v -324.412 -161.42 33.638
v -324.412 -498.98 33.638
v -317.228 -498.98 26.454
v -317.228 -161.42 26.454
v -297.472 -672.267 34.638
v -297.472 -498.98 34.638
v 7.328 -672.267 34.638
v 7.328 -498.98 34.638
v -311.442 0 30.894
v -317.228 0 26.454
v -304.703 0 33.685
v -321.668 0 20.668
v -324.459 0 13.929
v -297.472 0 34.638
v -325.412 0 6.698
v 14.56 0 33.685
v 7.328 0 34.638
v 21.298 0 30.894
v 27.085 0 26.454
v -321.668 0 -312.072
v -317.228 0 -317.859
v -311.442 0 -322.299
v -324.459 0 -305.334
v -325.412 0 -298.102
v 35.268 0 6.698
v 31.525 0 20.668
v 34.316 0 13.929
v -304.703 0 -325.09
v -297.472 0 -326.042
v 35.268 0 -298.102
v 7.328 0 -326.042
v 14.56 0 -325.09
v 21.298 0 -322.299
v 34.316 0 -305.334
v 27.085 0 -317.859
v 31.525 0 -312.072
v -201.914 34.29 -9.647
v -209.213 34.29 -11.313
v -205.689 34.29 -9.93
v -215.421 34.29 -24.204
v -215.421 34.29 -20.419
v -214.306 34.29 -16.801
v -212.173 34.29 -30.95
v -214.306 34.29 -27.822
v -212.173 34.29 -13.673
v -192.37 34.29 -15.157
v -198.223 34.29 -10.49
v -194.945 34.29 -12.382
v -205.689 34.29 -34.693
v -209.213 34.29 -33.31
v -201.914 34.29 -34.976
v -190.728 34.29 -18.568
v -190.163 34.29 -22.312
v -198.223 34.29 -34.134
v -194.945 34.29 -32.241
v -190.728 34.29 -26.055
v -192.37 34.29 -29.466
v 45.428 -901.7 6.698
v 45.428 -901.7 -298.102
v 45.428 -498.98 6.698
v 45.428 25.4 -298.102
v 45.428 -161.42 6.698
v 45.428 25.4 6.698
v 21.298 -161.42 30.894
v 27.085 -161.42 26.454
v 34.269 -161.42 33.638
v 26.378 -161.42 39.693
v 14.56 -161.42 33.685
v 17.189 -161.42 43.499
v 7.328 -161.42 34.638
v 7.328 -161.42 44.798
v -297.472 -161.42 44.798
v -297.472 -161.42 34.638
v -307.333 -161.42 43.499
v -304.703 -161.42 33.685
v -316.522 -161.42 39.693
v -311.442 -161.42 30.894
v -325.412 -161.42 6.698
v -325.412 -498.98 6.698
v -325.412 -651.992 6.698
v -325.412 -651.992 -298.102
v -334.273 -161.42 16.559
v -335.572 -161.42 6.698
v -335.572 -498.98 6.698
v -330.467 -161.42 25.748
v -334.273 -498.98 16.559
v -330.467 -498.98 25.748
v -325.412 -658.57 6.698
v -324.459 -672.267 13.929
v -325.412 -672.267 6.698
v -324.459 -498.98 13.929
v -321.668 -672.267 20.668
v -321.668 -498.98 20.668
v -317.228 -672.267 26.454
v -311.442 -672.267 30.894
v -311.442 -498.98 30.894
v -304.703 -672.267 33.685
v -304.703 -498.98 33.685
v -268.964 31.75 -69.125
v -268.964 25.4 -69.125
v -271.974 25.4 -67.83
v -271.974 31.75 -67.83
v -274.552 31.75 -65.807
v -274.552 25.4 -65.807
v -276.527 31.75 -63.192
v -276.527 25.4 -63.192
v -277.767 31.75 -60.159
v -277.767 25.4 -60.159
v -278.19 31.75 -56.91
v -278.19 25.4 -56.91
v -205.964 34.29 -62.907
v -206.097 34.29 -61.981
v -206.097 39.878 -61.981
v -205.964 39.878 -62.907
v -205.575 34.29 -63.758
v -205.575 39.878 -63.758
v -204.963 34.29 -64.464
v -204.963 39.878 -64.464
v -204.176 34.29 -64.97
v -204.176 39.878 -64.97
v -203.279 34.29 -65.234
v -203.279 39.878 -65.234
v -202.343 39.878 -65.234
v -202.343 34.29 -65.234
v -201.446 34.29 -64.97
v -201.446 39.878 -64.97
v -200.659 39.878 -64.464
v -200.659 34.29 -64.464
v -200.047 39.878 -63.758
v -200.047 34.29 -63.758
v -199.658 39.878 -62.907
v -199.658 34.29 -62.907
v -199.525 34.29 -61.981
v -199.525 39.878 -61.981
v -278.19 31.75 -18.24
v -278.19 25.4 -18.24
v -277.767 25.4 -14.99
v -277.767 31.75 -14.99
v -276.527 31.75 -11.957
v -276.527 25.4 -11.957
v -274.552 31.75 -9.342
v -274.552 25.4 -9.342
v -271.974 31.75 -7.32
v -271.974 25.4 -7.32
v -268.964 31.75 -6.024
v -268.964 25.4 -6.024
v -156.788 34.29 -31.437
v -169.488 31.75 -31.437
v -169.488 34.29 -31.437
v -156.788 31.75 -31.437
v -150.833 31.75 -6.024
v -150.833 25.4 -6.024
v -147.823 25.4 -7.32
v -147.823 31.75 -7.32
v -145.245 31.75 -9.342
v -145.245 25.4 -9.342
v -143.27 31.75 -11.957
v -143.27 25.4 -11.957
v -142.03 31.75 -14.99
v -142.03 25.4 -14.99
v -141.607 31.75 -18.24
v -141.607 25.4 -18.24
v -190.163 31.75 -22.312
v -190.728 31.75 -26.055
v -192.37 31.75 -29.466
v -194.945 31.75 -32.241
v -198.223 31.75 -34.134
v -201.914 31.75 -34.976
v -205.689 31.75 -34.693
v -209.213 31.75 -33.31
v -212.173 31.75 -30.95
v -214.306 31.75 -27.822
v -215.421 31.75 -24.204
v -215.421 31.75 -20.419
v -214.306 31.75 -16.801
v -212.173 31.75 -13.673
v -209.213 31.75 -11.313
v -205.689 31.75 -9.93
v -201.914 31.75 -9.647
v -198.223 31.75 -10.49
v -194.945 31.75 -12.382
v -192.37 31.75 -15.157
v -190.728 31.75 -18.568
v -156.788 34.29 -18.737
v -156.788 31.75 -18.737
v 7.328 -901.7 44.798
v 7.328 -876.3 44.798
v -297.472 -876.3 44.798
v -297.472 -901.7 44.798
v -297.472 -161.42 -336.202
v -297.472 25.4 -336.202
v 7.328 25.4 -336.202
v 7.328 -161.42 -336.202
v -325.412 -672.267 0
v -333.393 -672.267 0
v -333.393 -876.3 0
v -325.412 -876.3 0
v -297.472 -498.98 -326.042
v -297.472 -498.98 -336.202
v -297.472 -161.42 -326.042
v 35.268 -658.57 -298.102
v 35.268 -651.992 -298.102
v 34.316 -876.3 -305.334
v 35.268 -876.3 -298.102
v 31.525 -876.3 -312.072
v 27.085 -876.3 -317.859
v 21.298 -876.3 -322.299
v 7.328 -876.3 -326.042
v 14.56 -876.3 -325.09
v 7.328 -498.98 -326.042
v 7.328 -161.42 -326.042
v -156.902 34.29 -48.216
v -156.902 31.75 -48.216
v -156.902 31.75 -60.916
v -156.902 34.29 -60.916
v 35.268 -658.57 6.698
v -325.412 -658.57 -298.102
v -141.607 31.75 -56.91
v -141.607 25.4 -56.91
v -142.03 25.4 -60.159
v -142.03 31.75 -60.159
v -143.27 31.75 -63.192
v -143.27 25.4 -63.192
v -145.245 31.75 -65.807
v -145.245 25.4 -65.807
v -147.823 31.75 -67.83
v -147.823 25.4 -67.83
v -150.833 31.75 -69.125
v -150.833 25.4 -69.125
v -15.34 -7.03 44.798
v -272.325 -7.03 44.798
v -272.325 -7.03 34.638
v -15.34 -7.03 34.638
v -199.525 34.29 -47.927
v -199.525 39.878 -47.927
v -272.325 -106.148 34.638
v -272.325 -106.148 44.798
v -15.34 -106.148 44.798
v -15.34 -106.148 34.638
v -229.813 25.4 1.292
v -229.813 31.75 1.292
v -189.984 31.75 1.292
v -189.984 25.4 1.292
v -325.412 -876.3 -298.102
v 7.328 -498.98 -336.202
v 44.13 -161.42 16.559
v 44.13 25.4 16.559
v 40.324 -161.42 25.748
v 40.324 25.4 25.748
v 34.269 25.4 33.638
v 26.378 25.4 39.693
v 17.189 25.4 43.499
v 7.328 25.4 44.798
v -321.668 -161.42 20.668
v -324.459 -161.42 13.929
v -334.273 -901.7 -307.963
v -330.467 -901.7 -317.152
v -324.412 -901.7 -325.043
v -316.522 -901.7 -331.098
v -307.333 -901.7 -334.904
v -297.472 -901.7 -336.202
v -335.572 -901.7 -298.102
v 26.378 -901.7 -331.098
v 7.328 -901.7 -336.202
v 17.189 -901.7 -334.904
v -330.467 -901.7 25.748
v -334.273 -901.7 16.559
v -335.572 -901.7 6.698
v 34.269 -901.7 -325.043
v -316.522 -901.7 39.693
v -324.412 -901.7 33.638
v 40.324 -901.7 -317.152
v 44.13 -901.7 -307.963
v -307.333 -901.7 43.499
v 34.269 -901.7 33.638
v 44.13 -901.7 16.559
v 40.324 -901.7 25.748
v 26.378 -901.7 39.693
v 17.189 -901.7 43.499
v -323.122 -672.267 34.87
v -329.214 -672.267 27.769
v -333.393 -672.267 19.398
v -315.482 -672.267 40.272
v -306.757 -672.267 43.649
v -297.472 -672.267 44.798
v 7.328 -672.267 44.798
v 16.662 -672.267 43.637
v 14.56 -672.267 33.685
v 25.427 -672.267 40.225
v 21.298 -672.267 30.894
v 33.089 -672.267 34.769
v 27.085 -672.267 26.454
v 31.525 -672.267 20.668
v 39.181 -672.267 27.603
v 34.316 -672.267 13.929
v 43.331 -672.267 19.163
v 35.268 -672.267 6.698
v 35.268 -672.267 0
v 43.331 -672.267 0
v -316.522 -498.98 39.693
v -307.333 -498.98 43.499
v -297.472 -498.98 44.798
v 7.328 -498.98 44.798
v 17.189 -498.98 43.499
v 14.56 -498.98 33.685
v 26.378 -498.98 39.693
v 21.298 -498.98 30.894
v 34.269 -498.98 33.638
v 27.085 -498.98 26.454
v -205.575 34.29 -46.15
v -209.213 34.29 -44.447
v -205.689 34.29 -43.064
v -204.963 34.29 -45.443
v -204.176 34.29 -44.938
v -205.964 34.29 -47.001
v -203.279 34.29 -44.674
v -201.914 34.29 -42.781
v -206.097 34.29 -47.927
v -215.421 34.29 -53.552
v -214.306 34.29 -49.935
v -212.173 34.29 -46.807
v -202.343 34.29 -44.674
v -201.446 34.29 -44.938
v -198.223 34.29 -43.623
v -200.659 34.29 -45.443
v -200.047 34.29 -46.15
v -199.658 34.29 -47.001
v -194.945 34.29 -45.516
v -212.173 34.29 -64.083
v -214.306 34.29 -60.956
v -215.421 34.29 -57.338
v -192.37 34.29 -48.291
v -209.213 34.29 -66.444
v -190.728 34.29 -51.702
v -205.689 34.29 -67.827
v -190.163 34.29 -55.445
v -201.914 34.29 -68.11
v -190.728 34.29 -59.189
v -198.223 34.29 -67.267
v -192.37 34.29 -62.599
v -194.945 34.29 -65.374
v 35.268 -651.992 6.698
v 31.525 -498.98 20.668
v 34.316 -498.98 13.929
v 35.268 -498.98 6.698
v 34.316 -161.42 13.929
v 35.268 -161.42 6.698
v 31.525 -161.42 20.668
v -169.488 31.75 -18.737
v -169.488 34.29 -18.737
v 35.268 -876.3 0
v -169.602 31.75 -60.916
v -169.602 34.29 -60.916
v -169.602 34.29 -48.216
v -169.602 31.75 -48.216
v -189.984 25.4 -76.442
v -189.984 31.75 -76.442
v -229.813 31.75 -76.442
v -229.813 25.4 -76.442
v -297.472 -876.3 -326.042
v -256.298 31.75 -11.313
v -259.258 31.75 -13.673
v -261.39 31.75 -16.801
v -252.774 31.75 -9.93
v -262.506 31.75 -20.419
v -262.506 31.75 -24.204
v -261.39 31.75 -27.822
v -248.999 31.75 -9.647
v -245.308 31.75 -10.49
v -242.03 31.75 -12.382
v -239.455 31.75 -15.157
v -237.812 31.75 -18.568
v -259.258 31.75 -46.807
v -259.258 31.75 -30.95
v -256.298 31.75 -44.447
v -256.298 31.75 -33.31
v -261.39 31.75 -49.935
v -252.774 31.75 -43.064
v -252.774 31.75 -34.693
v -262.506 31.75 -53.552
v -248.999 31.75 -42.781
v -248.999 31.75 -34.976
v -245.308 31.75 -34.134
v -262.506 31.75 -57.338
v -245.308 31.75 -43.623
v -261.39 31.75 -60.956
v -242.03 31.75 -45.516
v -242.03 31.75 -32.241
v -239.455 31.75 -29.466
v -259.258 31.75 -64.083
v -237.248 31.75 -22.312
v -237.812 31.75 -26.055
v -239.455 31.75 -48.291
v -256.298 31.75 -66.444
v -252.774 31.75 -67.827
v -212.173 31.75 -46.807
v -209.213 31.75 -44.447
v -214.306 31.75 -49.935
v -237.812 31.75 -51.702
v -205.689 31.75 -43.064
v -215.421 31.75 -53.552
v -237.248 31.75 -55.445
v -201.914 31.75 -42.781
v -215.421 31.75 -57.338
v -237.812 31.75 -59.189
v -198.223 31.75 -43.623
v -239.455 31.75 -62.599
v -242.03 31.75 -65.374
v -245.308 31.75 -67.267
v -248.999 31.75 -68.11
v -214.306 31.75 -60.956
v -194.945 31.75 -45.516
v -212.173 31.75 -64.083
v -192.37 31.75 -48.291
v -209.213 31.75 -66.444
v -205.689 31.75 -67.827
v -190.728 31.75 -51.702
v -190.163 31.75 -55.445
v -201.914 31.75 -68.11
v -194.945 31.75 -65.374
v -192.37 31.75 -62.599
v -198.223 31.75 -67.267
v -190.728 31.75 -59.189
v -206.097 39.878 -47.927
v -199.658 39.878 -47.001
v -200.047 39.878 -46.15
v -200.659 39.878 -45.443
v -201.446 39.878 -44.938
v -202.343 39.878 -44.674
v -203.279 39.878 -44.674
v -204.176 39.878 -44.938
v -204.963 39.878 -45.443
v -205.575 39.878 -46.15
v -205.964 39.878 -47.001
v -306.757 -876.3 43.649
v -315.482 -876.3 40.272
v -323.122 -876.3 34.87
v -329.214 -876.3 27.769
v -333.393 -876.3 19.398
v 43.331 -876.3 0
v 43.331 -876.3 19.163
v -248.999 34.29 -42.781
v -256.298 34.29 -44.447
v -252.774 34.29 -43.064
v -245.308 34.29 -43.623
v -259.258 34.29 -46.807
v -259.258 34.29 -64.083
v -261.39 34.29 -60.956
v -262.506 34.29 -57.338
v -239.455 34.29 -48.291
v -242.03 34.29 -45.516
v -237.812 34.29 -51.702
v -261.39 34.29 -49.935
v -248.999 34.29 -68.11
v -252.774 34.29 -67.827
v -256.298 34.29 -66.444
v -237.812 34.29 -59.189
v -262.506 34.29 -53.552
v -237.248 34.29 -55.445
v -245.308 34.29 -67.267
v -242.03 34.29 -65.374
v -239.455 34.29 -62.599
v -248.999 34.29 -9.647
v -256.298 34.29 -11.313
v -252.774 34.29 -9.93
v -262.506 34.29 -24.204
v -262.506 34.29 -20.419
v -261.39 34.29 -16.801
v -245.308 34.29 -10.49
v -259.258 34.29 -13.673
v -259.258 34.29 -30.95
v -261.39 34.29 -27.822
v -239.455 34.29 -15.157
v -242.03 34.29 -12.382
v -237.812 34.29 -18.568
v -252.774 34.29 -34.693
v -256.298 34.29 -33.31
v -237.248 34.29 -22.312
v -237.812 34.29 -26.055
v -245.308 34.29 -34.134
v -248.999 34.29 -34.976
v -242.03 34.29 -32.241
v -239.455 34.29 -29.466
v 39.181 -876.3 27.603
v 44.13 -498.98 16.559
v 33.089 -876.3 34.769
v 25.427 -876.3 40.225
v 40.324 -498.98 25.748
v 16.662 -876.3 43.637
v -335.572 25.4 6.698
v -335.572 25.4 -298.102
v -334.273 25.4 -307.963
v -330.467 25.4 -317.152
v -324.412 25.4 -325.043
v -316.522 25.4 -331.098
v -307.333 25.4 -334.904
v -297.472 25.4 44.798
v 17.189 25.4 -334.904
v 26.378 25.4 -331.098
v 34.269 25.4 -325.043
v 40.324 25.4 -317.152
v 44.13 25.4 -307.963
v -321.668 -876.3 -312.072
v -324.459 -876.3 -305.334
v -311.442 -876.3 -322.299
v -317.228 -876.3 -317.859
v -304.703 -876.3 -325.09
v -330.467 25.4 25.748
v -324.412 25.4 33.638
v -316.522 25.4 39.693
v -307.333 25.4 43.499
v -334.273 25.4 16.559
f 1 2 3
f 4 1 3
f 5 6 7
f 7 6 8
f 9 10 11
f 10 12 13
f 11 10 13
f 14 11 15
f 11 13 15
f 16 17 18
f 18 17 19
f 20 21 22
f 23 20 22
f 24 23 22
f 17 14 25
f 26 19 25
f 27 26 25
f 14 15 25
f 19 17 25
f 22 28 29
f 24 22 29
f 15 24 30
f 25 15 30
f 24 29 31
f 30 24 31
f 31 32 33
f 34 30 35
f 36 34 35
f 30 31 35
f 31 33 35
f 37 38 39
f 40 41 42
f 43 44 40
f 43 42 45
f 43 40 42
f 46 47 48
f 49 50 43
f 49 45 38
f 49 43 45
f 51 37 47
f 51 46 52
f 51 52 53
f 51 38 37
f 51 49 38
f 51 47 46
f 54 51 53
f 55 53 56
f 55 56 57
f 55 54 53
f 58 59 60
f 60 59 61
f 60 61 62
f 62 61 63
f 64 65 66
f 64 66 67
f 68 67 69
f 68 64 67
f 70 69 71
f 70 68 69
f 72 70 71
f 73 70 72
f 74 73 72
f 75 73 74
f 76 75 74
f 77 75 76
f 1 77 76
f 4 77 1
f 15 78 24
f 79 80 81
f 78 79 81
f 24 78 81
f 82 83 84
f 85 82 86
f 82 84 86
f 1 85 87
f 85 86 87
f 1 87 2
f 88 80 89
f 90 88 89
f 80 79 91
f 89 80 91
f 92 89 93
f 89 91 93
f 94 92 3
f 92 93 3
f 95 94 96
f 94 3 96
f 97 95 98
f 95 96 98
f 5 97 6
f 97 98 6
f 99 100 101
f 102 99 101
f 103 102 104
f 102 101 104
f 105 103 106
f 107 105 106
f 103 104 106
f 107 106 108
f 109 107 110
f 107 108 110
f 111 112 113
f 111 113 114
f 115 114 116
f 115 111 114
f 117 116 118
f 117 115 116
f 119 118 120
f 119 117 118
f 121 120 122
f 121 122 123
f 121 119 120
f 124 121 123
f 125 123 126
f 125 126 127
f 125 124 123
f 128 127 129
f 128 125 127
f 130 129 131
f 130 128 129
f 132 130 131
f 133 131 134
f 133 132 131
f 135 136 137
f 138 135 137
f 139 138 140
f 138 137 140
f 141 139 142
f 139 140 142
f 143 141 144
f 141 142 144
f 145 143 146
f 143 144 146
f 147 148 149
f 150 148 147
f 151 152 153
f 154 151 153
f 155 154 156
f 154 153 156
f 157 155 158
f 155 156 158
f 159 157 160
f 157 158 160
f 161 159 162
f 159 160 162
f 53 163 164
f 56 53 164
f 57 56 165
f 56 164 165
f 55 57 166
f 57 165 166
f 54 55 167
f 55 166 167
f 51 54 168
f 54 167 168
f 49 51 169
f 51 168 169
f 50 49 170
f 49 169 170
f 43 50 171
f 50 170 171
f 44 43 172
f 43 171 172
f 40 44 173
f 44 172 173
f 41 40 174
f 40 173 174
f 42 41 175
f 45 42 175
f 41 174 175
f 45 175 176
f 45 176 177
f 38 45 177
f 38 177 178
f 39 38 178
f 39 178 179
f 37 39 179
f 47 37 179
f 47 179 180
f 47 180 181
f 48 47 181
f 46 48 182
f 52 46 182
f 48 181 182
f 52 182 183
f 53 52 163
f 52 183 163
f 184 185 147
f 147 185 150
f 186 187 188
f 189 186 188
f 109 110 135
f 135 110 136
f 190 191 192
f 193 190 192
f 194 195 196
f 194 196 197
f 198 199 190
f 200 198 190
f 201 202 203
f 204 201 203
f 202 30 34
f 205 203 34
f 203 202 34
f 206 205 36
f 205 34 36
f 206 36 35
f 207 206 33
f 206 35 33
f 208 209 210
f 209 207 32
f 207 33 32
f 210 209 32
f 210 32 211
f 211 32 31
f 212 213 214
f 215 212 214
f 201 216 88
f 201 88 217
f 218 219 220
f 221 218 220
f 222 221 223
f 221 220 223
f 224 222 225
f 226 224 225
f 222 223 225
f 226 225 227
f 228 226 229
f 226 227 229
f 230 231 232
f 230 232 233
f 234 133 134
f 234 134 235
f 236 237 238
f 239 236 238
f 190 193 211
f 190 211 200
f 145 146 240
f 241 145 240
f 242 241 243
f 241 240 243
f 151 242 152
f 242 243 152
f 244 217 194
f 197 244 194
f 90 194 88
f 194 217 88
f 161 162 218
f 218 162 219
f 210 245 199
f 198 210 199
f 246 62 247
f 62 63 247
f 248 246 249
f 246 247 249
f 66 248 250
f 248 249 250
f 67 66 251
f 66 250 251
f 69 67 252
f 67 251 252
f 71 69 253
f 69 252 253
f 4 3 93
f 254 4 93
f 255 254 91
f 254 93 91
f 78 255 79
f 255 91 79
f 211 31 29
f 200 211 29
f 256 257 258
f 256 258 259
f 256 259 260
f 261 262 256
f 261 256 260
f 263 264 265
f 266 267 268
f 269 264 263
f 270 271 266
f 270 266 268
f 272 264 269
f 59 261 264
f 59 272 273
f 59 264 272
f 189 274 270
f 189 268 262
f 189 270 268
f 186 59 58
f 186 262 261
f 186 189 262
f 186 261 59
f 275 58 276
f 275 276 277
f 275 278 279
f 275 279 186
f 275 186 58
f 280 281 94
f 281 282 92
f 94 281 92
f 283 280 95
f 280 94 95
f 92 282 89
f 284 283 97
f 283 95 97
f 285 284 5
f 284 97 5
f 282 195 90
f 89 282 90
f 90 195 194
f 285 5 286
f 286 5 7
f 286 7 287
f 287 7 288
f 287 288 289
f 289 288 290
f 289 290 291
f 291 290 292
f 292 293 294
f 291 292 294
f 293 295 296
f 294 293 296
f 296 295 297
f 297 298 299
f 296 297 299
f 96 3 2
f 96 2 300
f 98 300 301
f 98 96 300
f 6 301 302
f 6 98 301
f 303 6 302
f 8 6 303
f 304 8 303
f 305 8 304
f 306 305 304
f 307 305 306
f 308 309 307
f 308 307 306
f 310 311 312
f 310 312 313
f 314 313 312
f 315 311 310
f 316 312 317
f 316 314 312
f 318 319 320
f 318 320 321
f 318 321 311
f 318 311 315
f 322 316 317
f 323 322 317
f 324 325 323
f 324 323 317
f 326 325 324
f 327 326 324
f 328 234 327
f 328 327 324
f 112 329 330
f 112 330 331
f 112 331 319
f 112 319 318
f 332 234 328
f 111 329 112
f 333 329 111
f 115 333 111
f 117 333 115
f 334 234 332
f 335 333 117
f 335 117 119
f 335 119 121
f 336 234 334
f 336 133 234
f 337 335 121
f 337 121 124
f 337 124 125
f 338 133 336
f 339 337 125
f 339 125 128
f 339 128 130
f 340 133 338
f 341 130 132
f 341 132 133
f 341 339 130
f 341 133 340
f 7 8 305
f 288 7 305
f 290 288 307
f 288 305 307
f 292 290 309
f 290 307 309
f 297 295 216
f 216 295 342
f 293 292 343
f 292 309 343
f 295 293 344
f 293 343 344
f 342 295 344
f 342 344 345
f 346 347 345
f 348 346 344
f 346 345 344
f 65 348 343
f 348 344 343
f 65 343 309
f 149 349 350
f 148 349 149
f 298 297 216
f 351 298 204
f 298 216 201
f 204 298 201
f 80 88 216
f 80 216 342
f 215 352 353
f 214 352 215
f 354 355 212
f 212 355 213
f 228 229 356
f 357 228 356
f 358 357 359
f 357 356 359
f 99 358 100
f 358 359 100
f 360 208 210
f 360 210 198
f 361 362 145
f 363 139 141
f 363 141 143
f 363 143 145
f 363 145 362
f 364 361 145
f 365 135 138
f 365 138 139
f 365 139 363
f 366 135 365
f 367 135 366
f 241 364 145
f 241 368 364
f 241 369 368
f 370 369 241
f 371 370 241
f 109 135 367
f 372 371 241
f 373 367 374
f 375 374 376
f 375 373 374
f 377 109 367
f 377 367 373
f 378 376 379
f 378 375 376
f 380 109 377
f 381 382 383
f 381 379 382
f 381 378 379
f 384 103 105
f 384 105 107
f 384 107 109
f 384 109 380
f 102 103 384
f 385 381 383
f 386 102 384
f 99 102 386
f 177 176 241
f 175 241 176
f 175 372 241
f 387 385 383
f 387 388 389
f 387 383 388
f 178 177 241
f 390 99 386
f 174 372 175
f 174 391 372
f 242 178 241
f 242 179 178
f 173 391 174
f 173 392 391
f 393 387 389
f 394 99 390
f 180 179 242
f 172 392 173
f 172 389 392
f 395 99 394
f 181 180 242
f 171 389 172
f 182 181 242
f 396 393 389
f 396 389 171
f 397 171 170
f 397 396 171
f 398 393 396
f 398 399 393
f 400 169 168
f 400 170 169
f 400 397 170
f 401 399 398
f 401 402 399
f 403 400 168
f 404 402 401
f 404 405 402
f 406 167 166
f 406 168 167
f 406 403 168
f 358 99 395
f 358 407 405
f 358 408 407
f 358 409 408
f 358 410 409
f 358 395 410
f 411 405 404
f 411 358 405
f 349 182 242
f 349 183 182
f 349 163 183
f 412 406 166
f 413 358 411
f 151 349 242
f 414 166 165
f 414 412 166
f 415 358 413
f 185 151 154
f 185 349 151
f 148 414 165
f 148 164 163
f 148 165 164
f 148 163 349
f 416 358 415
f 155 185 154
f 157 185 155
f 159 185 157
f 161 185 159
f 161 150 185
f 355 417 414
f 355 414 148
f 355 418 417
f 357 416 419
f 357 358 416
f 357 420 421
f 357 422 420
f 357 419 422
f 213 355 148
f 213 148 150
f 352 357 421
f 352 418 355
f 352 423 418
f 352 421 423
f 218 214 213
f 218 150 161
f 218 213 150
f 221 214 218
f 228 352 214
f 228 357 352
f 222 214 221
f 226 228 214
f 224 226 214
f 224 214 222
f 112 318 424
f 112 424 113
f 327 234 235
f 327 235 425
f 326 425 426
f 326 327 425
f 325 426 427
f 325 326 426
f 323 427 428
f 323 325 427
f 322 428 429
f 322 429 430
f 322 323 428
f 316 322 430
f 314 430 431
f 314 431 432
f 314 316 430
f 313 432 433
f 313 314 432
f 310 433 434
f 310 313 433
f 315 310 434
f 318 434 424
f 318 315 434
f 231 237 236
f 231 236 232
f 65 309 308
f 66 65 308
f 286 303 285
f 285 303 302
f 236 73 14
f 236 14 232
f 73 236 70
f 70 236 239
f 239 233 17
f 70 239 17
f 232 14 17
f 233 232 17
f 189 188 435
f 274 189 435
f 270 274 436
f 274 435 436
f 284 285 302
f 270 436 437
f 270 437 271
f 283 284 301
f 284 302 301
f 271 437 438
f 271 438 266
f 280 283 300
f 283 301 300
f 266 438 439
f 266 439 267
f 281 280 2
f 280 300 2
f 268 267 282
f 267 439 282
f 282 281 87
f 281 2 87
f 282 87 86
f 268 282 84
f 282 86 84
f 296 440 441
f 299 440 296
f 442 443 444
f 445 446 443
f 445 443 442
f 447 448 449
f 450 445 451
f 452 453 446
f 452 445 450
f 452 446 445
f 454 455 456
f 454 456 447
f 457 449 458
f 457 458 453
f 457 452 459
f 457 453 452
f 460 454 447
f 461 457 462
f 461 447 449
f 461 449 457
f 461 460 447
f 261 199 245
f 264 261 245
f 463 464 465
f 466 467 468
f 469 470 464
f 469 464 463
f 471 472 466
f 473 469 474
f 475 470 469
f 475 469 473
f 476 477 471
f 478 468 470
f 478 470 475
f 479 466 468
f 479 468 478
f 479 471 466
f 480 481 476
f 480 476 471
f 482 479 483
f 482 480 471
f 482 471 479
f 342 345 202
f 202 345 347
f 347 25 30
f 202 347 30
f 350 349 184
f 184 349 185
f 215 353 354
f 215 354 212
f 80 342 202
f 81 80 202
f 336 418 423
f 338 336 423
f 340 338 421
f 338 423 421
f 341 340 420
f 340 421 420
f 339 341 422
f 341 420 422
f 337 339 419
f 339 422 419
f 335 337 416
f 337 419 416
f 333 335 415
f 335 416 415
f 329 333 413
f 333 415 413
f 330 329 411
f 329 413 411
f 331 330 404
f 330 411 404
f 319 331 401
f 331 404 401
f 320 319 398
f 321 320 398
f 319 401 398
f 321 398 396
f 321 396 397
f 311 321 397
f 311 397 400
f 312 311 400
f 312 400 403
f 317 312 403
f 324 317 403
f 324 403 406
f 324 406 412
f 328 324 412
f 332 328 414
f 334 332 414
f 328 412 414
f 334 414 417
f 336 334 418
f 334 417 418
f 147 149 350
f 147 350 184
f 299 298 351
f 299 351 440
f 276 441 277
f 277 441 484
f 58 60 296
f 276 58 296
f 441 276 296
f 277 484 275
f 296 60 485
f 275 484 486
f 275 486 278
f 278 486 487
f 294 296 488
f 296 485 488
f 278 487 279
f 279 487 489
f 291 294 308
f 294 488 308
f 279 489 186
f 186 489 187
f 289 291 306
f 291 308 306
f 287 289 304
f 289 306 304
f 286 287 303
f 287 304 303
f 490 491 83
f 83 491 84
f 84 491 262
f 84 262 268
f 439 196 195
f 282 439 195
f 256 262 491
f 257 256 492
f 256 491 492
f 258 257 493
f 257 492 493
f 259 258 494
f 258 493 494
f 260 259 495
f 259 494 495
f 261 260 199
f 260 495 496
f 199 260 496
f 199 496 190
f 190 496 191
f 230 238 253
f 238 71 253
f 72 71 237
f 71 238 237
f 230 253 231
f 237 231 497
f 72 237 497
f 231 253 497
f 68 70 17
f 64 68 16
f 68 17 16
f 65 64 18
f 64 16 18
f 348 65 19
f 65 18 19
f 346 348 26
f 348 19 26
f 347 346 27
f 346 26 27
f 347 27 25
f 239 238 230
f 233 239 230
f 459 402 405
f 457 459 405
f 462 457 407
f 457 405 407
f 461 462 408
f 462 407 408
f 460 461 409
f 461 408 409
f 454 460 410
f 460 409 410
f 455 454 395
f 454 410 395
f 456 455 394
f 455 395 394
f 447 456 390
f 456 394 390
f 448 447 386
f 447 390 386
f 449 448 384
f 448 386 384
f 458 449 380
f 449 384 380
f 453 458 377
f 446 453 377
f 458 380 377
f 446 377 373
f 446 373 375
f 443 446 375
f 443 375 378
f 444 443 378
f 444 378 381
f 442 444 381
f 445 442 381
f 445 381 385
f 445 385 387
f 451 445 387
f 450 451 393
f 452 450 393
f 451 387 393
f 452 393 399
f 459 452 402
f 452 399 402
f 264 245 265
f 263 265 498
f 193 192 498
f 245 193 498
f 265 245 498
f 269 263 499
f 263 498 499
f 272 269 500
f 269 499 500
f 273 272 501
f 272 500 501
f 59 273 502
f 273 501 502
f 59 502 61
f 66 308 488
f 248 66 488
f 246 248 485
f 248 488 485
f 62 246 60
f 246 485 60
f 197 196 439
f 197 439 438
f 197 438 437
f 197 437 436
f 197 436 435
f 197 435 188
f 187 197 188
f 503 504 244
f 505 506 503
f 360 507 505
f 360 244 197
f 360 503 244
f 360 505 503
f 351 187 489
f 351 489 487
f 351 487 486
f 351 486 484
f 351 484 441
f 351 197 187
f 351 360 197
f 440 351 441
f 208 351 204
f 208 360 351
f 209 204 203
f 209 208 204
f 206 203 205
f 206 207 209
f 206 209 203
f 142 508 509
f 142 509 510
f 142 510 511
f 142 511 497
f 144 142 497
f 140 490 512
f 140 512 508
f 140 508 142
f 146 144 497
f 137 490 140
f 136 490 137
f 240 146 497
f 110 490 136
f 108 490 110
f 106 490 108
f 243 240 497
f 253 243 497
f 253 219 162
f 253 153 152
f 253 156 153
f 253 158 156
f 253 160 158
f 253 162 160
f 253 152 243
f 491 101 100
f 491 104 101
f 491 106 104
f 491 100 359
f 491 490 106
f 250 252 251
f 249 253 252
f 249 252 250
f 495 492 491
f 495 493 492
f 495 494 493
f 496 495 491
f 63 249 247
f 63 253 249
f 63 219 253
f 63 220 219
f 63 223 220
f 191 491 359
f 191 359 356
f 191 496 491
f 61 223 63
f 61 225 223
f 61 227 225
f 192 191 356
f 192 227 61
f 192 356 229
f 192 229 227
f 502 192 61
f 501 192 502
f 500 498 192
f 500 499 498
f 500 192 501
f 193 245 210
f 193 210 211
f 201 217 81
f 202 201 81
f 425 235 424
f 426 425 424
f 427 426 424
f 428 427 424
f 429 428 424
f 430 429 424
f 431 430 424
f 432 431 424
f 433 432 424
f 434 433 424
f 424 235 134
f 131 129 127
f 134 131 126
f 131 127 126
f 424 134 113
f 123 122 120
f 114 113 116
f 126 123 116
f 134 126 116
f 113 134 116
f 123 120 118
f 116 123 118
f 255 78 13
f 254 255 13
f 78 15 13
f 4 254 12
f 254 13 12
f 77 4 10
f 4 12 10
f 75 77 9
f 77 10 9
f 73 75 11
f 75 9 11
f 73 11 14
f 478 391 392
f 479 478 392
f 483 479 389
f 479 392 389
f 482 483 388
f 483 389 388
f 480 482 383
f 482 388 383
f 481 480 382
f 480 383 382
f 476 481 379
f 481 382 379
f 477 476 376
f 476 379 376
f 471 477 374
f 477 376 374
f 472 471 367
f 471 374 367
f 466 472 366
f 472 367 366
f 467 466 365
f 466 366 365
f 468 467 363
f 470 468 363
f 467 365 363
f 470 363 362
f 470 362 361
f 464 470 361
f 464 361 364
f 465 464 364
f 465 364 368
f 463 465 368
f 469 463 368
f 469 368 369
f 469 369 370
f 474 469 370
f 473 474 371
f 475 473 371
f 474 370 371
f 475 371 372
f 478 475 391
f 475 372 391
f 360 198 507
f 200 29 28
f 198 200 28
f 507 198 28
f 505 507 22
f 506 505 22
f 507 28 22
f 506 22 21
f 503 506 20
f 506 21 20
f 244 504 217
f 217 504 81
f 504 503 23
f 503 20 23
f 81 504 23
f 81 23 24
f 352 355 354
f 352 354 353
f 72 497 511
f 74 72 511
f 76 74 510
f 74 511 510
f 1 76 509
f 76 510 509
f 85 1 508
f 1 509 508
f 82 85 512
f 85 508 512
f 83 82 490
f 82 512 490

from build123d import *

# Parameters (mm, degrees)
SKETCH1_W            = 381
SKETCH1_H            = 381
BOSS_EXTRUDE1_DEPTH  = 25.4
BOSS_EXTRUDE2_DEPTH  = 6.35
SKETCH3_R            = 12.7
SKETCH3_W            = 12.7
SKETCH3_H            = 12.7
BOSS_EXTRUDE3_DEPTH  = 2.54
FILLET1_R            = 38.1
BOSS_EXTRUDE4_DEPTH  = 914.4
BOSS_EXTRUDE5_DEPTH  = 12.7
CUT_EXTRUDE2_DEPTH   = 167.894
SKETCH11_W           = 304.8
SKETCH11_H           = 337.560693512
CUT_EXTRUDE7_DEPTH   = 110.998
SKETCH14_W           = 376.723987394
SKETCH14_H           = 204.033096405
CUT_EXTRUDE9_DEPTH   = 672.066
BOSS_EXTRUDE7_DEPTH  = 12.7
BOSS_EXTRUDE8_REACH  = 372.84
SKETCH16_W           = 304.8
SKETCH16_H           = 6.578487437
SKETCH17_W           = 256.984779842
SKETCH17_H           = 99.117758391
CUT_EXTRUDE10_DEPTH  = 65.532
BOSS_EXTRUDE9_DEPTH  = 337.560694
BOSS_EXTRUDE10_DEPTH = 5.588


with BuildPart() as part:
    # Sketch1 → Boss-Extrude1 (new body)
    with BuildSketch(Plane(origin=(0, 0, 0), x_dir=(1, 0, 0), z_dir=(0, 1, 0))):
        with Locations((-145.071527203, 145.702478214)):
            Rectangle(SKETCH1_W, SKETCH1_H)
    extrude(amount=BOSS_EXTRUDE1_DEPTH)

    # Sketch2 → Boss-Extrude2 (add)
    with BuildSketch(Plane(origin=(0, 25.4, 0), x_dir=(1, 0, 0), z_dir=(0, 1, 0))):
        with BuildLine():
            Line((-278.18981895, 56.909871518), (-278.18981895, 18.239718765))
            ThreePointArc((-278.18981895, 18.239718765), (-275.624301912, 10.585814199), (-268.964266966, 6.024228149))
            ThreePointArc((-268.964266966, 6.024228149), (-209.898650693, -2.212431383), (-150.833034421, 6.024228149))
            ThreePointArc((-150.833034421, 6.024228149), (-144.172999475, 10.585814199), (-141.607482437, 18.239718765))
            Line((-141.607482437, 18.239718765), (-141.607482437, 56.909871518))
            ThreePointArc((-141.607482437, 56.909871518), (-144.172999475, 64.563776083), (-150.833034421, 69.125362134))
            ThreePointArc((-150.833034421, 69.125362134), (-209.898650693, 77.362021666), (-268.964266966, 69.125362134))
            ThreePointArc((-268.964266966, 69.125362134), (-275.624301912, 64.563776083), (-278.18981895, 56.909871518))
        make_face()
    extrude(amount=BOSS_EXTRUDE2_DEPTH)

    # Sketch3 → Boss-Extrude3 (add)
    with BuildSketch(Plane(origin=(0, 31.75, 0), x_dir=(1, 0, 0), z_dir=(0, 1, 0))):
        with Locations((-249.948168026, 55.44519483)):
            Circle(SKETCH3_R)
        with Locations((-249.948168026, 22.311626762)):
            Circle(SKETCH3_R)
        with Locations((-202.863297366, 55.44519483)):
            Circle(SKETCH3_R)
        with Locations((-202.863297366, 22.311626762)):
            Circle(SKETCH3_R)
        with Locations((-163.252071019, 54.565913405)):
            Rectangle(SKETCH3_W, SKETCH3_H)
        with Locations((-163.138085387, 25.086983412)):
            Rectangle(SKETCH3_W, SKETCH3_H)
    extrude(amount=BOSS_EXTRUDE3_DEPTH)

    # Fillet1
    fillet1_edges = [part.edges().sort_by_distance(p)[0] for p in [
        (-335.571527203, 12.7, -336.202478214),
        (45.428472797, 12.7, -336.202478214),
        (45.428472797, 12.7, 44.797521786),
        (-335.571527203, 12.7, 44.797521786),
    ]]
    fillet(fillet1_edges, radius=FILLET1_R)

    # Sketch6 → Boss-Extrude4 (add)
    with BuildSketch(Plane(origin=(0, 25.4, 0), x_dir=(1, 0, 0), z_dir=(0, 1, 0))):
        with BuildLine():
            Line((-335.571527203, 298.102478214), (-335.571527203, -6.697521786))
            ThreePointArc((-335.571527203, -6.697521786), (-324.412295566, -33.638290149), (-297.471527203, -44.797521786))
            Line((-297.471527203, -44.797521786), (7.328472797, -44.797521786))
            ThreePointArc((7.328472797, -44.797521786), (34.26924116, -33.638290149), (45.428472797, -6.697521786))
            Line((45.428472797, -6.697521786), (45.428472797, 298.102478214))
            ThreePointArc((45.428472797, 298.102478214), (34.26924116, 325.043246577), (7.328472797, 336.202478214))
            Line((7.328472797, 336.202478214), (-297.471527203, 336.202478214))
            ThreePointArc((-297.471527203, 336.202478214), (-324.412295566, 325.043246577), (-335.571527203, 298.102478214))
        make_face()
        with BuildLine():
            Line((7.328472797, 326.042478214), (-297.471527203, 326.042478214))
            ThreePointArc((-297.471527203, 326.042478214), (-317.22809067, 317.859041681), (-325.411527203, 298.102478214))
            Line((-325.411527203, 298.102478214), (-325.411527203, -6.697521786))
            ThreePointArc((-325.411527203, -6.697521786), (-317.22809067, -26.454085252), (-297.471527203, -34.637521786))
            Line((-297.471527203, -34.637521786), (7.328472797, -34.637521786))
            ThreePointArc((7.328472797, -34.637521786), (27.085036263, -26.454085252), (35.268472797, -6.697521786))
            Line((35.268472797, -6.697521786), (35.268472797, 298.102478214))
            ThreePointArc((35.268472797, 298.102478214), (27.085036263, 317.859041681), (7.328472797, 326.042478214))
        make_face(mode=Mode.SUBTRACT)
    extrude(amount=-BOSS_EXTRUDE4_DEPTH)

    # Sketch7 → Boss-Extrude5 (add)
    with BuildSketch(Plane.XZ.offset(889)):
        with BuildLine():
            Line((-297.471527203, -336.202478214), (7.328472797, -336.202478214))
            ThreePointArc((7.328472797, -336.202478214), (34.26924116, -325.043246577), (45.428472797, -298.102478214))
            Line((45.428472797, -298.102478214), (45.428472797, 6.697521786))
            ThreePointArc((45.428472797, 6.697521786), (34.26924116, 33.638290149), (7.328472797, 44.797521786))
            Line((7.328472797, 44.797521786), (-297.471527203, 44.797521786))
            ThreePointArc((-297.471527203, 44.797521786), (-324.412295566, 33.638290149), (-335.571527203, 6.697521786))
            Line((-335.571527203, 6.697521786), (-335.571527203, -298.102478214))
            ThreePointArc((-335.571527203, -298.102478214), (-324.412295566, -325.043246577), (-297.471527203, -336.202478214))
        make_face()
    extrude(amount=BOSS_EXTRUDE5_DEPTH)

    # Sketch9 → Cut-Extrude2 (cut)
    with BuildSketch(Plane.XY):
        with BuildLine():
            Line((45.428472797, -161.419653244), (-335.571527203, -161.419653244))
            Line((-335.571527203, -161.419653244), (-259.140976729, -229.136056455))
            ThreePointArc((-259.140976729, -229.136056455), (-145.071527203, -177.8), (-31.002077677, -229.136056455))
            Line((-31.002077677, -229.136056455), (45.428472797, -161.419653244))
        make_face()
        with BuildLine():
            Line((-335.571527203, -161.419653244), (-335.571527203, -498.980346756))
            Line((-335.571527203, -498.980346756), (-259.140976729, -431.263943545))
            ThreePointArc((-259.140976729, -431.263943545), (-297.471527203, -330.2), (-259.140976729, -229.136056455))
            Line((-259.140976729, -229.136056455), (-335.571527203, -161.419653244))
        make_face()
        with BuildLine():
            Line((-31.002077677, -431.263943545), (45.428472797, -498.980346756))
            Line((45.428472797, -498.980346756), (45.428472797, -161.419653244))
            Line((45.428472797, -161.419653244), (-31.002077677, -229.136056455))
            ThreePointArc((-31.002077677, -229.136056455), (-2.576011295, -276.155685349), (7.328472797, -330.2))
            ThreePointArc((7.328472797, -330.2), (-2.576011295, -384.244314651), (-31.002077677, -431.263943545))
        make_face()
        with BuildLine():
            Line((-259.140976729, -431.263943545), (-335.571527203, -498.980346756))
            Line((-335.571527203, -498.980346756), (45.428472797, -498.980346756))
            Line((45.428472797, -498.980346756), (-31.002077677, -431.263943545))
            ThreePointArc((-31.002077677, -431.263943545), (-145.071527203, -482.6), (-259.140976729, -431.263943545))
        make_face()
        with BuildLine():
            ThreePointArc((-259.140976729, -229.136056455), (-297.471527203, -330.2), (-259.140976729, -431.263943545))
            Line((-259.140976729, -431.263943545), (-145.071527203, -330.2))
            Line((-145.071527203, -330.2), (-259.140976729, -229.136056455))
        make_face()
        with BuildLine():
            Line((-145.071527203, -330.2), (-259.140976729, -431.263943545))
            ThreePointArc((-259.140976729, -431.263943545), (-145.071527203, -482.6), (-31.002077677, -431.263943545))
            Line((-31.002077677, -431.263943545), (-145.071527203, -330.2))
        make_face()
        with BuildLine():
            Line((-145.071527203, -330.2), (-31.002077677, -431.263943545))
            ThreePointArc((-31.002077677, -431.263943545), (-2.576011295, -384.244314651), (7.328472797, -330.2))
            ThreePointArc((7.328472797, -330.2), (-2.576011295, -276.155685349), (-31.002077677, -229.136056455))
            Line((-31.002077677, -229.136056455), (-145.071527203, -330.2))
        make_face()
        with BuildLine():
            ThreePointArc((-31.002077677, -229.136056455), (-145.071527203, -177.8), (-259.140976729, -229.136056455))
            Line((-259.140976729, -229.136056455), (-145.071527203, -330.2))
            Line((-145.071527203, -330.2), (-31.002077677, -229.136056455))
        make_face()
    extrude(amount=CUT_EXTRUDE2_DEPTH, mode=Mode.SUBTRACT)

    # Sketch11 → Cut-Extrude7 (cut)
    with BuildSketch(Plane(origin=(0, 0, -336.202478214), x_dir=(-1, 0, 0), z_dir=(0, 0, -1))):
        with Locations((145.071527203, -330.2)):
            Rectangle(SKETCH11_W, SKETCH11_H)
    extrude(amount=-CUT_EXTRUDE7_DEPTH, mode=Mode.SUBTRACT)

    # Sketch14 → Cut-Extrude9 (cut)
    with BuildSketch(Plane.XY):
        with Locations((-145.03055799, -774.283451797)):
            Rectangle(SKETCH14_W, SKETCH14_H)
    extrude(amount=CUT_EXTRUDE9_DEPTH, mode=Mode.SUBTRACT)

    # Sketch15 → Boss-Extrude7 (add)
    with BuildSketch(Plane(origin=(0, -889, 0), x_dir=(1, 0, 0), z_dir=(0, 1, 0))):
        with BuildLine():
            Line((35.268472797, -6.697521786), (35.268472797, 298.102478214))
            ThreePointArc((35.268472797, 298.102478214), (27.085036263, 317.859041681), (7.328472797, 326.042478214))
            Line((7.328472797, 326.042478214), (-297.471527203, 326.042478214))
            ThreePointArc((-297.471527203, 326.042478214), (-317.22809067, 317.859041681), (-325.411527203, 298.102478214))
            Line((-325.411527203, 298.102478214), (-325.411527203, -6.697521786))
            ThreePointArc((-325.411527203, -6.697521786), (-317.22809067, -26.454085252), (-297.471527203, -34.637521786))
            Line((-297.471527203, -34.637521786), (7.328472797, -34.637521786))
            ThreePointArc((7.328472797, -34.637521786), (27.085036263, -26.454085252), (35.268472797, -6.697521786))
        make_face()
    extrude(amount=BOSS_EXTRUDE7_DEPTH)

    # Sketch16 → Boss-Extrude8 (add, up to next)
    with BuildSketch(Plane(origin=(-325.411527203, 0, 0), x_dir=(0, 0, -1), z_dir=(1, 0, 0)), mode=Mode.PRIVATE) as boss_extrude8_sk1:
        with Locations((145.702478214, -655.281036831)):
            Rectangle(SKETCH16_W, SKETCH16_H)
    boss_extrude8_tool1 = extrude(boss_extrude8_sk1.sketch, amount=BOSS_EXTRUDE8_REACH, mode=Mode.PRIVATE) - part.part
    add(boss_extrude8_tool1.solids().sort_by_distance((-325.411527, -655.281037, -145.702478))[0])

    # Sketch17 → Cut-Extrude10 (cut)
    with BuildSketch(Plane.XY.offset(44.797521786)):
        with Locations((-143.832555223, -56.589097106)):
            Rectangle(SKETCH17_W, SKETCH17_H)
    extrude(amount=-CUT_EXTRUDE10_DEPTH, mode=Mode.SUBTRACT)

    # Sketch18 → Boss-Extrude9 (add)
    with BuildSketch(Plane(origin=(0, -498.980346756, 0), x_dir=(1, 0, 0), z_dir=(0, 1, 0))):
        with BuildLine():
            ThreePointArc((-335.571527203, -6.697521786), (-332.671337392, -21.277760559), (-324.412295566, -33.638290149))
            Line((-324.412295566, -33.638290149), (-317.22809067, -26.454085252))
            ThreePointArc((-317.22809067, -26.454085252), (-323.284721342, -17.389696886), (-325.411527203, -6.697521786))
            Line((-325.411527203, -6.697521786), (-325.411527203, 0))
            Line((-325.411527203, 0), (-335.571527203, 0))
            Line((-335.571527203, 0), (-335.571527203, -6.697521786))
        make_face()
        with BuildLine():
            Line((27.085036263, -26.454085252), (34.26924116, -33.638290149))
            ThreePointArc((34.26924116, -33.638290149), (42.528282985, -21.277760559), (45.428472797, -6.697521786))
            Line((45.428472797, -6.697521786), (45.428472797, 0))
            Line((45.428472797, 0), (35.268472797, 0))
            Line((35.268472797, 0), (35.268472797, -6.697521786))
            ThreePointArc((35.268472797, -6.697521786), (33.141666935, -17.389696886), (27.085036263, -26.454085252))
        make_face()
    extrude(amount=BOSS_EXTRUDE9_DEPTH)

    # Sketch19 → Boss-Extrude10 (add)
    with BuildSketch(Plane(origin=(0, 34.29, 0), x_dir=(1, 0, 0), z_dir=(0, 1, 0))):
        with BuildLine():
            Line((-199.52514655, 61.981140549), (-199.52514655, 47.926597628))
            ThreePointArc((-199.52514655, 47.926597628), (-202.811044116, 44.640700062), (-206.096941682, 47.926597628))
            Line((-206.096941682, 47.926597628), (-206.096941682, 61.981140549))
            ThreePointArc((-206.096941682, 61.981140549), (-202.811044116, 65.267038115), (-199.52514655, 61.981140549))
        make_face()
    extrude(amount=BOSS_EXTRUDE10_DEPTH)


solid = part.part
